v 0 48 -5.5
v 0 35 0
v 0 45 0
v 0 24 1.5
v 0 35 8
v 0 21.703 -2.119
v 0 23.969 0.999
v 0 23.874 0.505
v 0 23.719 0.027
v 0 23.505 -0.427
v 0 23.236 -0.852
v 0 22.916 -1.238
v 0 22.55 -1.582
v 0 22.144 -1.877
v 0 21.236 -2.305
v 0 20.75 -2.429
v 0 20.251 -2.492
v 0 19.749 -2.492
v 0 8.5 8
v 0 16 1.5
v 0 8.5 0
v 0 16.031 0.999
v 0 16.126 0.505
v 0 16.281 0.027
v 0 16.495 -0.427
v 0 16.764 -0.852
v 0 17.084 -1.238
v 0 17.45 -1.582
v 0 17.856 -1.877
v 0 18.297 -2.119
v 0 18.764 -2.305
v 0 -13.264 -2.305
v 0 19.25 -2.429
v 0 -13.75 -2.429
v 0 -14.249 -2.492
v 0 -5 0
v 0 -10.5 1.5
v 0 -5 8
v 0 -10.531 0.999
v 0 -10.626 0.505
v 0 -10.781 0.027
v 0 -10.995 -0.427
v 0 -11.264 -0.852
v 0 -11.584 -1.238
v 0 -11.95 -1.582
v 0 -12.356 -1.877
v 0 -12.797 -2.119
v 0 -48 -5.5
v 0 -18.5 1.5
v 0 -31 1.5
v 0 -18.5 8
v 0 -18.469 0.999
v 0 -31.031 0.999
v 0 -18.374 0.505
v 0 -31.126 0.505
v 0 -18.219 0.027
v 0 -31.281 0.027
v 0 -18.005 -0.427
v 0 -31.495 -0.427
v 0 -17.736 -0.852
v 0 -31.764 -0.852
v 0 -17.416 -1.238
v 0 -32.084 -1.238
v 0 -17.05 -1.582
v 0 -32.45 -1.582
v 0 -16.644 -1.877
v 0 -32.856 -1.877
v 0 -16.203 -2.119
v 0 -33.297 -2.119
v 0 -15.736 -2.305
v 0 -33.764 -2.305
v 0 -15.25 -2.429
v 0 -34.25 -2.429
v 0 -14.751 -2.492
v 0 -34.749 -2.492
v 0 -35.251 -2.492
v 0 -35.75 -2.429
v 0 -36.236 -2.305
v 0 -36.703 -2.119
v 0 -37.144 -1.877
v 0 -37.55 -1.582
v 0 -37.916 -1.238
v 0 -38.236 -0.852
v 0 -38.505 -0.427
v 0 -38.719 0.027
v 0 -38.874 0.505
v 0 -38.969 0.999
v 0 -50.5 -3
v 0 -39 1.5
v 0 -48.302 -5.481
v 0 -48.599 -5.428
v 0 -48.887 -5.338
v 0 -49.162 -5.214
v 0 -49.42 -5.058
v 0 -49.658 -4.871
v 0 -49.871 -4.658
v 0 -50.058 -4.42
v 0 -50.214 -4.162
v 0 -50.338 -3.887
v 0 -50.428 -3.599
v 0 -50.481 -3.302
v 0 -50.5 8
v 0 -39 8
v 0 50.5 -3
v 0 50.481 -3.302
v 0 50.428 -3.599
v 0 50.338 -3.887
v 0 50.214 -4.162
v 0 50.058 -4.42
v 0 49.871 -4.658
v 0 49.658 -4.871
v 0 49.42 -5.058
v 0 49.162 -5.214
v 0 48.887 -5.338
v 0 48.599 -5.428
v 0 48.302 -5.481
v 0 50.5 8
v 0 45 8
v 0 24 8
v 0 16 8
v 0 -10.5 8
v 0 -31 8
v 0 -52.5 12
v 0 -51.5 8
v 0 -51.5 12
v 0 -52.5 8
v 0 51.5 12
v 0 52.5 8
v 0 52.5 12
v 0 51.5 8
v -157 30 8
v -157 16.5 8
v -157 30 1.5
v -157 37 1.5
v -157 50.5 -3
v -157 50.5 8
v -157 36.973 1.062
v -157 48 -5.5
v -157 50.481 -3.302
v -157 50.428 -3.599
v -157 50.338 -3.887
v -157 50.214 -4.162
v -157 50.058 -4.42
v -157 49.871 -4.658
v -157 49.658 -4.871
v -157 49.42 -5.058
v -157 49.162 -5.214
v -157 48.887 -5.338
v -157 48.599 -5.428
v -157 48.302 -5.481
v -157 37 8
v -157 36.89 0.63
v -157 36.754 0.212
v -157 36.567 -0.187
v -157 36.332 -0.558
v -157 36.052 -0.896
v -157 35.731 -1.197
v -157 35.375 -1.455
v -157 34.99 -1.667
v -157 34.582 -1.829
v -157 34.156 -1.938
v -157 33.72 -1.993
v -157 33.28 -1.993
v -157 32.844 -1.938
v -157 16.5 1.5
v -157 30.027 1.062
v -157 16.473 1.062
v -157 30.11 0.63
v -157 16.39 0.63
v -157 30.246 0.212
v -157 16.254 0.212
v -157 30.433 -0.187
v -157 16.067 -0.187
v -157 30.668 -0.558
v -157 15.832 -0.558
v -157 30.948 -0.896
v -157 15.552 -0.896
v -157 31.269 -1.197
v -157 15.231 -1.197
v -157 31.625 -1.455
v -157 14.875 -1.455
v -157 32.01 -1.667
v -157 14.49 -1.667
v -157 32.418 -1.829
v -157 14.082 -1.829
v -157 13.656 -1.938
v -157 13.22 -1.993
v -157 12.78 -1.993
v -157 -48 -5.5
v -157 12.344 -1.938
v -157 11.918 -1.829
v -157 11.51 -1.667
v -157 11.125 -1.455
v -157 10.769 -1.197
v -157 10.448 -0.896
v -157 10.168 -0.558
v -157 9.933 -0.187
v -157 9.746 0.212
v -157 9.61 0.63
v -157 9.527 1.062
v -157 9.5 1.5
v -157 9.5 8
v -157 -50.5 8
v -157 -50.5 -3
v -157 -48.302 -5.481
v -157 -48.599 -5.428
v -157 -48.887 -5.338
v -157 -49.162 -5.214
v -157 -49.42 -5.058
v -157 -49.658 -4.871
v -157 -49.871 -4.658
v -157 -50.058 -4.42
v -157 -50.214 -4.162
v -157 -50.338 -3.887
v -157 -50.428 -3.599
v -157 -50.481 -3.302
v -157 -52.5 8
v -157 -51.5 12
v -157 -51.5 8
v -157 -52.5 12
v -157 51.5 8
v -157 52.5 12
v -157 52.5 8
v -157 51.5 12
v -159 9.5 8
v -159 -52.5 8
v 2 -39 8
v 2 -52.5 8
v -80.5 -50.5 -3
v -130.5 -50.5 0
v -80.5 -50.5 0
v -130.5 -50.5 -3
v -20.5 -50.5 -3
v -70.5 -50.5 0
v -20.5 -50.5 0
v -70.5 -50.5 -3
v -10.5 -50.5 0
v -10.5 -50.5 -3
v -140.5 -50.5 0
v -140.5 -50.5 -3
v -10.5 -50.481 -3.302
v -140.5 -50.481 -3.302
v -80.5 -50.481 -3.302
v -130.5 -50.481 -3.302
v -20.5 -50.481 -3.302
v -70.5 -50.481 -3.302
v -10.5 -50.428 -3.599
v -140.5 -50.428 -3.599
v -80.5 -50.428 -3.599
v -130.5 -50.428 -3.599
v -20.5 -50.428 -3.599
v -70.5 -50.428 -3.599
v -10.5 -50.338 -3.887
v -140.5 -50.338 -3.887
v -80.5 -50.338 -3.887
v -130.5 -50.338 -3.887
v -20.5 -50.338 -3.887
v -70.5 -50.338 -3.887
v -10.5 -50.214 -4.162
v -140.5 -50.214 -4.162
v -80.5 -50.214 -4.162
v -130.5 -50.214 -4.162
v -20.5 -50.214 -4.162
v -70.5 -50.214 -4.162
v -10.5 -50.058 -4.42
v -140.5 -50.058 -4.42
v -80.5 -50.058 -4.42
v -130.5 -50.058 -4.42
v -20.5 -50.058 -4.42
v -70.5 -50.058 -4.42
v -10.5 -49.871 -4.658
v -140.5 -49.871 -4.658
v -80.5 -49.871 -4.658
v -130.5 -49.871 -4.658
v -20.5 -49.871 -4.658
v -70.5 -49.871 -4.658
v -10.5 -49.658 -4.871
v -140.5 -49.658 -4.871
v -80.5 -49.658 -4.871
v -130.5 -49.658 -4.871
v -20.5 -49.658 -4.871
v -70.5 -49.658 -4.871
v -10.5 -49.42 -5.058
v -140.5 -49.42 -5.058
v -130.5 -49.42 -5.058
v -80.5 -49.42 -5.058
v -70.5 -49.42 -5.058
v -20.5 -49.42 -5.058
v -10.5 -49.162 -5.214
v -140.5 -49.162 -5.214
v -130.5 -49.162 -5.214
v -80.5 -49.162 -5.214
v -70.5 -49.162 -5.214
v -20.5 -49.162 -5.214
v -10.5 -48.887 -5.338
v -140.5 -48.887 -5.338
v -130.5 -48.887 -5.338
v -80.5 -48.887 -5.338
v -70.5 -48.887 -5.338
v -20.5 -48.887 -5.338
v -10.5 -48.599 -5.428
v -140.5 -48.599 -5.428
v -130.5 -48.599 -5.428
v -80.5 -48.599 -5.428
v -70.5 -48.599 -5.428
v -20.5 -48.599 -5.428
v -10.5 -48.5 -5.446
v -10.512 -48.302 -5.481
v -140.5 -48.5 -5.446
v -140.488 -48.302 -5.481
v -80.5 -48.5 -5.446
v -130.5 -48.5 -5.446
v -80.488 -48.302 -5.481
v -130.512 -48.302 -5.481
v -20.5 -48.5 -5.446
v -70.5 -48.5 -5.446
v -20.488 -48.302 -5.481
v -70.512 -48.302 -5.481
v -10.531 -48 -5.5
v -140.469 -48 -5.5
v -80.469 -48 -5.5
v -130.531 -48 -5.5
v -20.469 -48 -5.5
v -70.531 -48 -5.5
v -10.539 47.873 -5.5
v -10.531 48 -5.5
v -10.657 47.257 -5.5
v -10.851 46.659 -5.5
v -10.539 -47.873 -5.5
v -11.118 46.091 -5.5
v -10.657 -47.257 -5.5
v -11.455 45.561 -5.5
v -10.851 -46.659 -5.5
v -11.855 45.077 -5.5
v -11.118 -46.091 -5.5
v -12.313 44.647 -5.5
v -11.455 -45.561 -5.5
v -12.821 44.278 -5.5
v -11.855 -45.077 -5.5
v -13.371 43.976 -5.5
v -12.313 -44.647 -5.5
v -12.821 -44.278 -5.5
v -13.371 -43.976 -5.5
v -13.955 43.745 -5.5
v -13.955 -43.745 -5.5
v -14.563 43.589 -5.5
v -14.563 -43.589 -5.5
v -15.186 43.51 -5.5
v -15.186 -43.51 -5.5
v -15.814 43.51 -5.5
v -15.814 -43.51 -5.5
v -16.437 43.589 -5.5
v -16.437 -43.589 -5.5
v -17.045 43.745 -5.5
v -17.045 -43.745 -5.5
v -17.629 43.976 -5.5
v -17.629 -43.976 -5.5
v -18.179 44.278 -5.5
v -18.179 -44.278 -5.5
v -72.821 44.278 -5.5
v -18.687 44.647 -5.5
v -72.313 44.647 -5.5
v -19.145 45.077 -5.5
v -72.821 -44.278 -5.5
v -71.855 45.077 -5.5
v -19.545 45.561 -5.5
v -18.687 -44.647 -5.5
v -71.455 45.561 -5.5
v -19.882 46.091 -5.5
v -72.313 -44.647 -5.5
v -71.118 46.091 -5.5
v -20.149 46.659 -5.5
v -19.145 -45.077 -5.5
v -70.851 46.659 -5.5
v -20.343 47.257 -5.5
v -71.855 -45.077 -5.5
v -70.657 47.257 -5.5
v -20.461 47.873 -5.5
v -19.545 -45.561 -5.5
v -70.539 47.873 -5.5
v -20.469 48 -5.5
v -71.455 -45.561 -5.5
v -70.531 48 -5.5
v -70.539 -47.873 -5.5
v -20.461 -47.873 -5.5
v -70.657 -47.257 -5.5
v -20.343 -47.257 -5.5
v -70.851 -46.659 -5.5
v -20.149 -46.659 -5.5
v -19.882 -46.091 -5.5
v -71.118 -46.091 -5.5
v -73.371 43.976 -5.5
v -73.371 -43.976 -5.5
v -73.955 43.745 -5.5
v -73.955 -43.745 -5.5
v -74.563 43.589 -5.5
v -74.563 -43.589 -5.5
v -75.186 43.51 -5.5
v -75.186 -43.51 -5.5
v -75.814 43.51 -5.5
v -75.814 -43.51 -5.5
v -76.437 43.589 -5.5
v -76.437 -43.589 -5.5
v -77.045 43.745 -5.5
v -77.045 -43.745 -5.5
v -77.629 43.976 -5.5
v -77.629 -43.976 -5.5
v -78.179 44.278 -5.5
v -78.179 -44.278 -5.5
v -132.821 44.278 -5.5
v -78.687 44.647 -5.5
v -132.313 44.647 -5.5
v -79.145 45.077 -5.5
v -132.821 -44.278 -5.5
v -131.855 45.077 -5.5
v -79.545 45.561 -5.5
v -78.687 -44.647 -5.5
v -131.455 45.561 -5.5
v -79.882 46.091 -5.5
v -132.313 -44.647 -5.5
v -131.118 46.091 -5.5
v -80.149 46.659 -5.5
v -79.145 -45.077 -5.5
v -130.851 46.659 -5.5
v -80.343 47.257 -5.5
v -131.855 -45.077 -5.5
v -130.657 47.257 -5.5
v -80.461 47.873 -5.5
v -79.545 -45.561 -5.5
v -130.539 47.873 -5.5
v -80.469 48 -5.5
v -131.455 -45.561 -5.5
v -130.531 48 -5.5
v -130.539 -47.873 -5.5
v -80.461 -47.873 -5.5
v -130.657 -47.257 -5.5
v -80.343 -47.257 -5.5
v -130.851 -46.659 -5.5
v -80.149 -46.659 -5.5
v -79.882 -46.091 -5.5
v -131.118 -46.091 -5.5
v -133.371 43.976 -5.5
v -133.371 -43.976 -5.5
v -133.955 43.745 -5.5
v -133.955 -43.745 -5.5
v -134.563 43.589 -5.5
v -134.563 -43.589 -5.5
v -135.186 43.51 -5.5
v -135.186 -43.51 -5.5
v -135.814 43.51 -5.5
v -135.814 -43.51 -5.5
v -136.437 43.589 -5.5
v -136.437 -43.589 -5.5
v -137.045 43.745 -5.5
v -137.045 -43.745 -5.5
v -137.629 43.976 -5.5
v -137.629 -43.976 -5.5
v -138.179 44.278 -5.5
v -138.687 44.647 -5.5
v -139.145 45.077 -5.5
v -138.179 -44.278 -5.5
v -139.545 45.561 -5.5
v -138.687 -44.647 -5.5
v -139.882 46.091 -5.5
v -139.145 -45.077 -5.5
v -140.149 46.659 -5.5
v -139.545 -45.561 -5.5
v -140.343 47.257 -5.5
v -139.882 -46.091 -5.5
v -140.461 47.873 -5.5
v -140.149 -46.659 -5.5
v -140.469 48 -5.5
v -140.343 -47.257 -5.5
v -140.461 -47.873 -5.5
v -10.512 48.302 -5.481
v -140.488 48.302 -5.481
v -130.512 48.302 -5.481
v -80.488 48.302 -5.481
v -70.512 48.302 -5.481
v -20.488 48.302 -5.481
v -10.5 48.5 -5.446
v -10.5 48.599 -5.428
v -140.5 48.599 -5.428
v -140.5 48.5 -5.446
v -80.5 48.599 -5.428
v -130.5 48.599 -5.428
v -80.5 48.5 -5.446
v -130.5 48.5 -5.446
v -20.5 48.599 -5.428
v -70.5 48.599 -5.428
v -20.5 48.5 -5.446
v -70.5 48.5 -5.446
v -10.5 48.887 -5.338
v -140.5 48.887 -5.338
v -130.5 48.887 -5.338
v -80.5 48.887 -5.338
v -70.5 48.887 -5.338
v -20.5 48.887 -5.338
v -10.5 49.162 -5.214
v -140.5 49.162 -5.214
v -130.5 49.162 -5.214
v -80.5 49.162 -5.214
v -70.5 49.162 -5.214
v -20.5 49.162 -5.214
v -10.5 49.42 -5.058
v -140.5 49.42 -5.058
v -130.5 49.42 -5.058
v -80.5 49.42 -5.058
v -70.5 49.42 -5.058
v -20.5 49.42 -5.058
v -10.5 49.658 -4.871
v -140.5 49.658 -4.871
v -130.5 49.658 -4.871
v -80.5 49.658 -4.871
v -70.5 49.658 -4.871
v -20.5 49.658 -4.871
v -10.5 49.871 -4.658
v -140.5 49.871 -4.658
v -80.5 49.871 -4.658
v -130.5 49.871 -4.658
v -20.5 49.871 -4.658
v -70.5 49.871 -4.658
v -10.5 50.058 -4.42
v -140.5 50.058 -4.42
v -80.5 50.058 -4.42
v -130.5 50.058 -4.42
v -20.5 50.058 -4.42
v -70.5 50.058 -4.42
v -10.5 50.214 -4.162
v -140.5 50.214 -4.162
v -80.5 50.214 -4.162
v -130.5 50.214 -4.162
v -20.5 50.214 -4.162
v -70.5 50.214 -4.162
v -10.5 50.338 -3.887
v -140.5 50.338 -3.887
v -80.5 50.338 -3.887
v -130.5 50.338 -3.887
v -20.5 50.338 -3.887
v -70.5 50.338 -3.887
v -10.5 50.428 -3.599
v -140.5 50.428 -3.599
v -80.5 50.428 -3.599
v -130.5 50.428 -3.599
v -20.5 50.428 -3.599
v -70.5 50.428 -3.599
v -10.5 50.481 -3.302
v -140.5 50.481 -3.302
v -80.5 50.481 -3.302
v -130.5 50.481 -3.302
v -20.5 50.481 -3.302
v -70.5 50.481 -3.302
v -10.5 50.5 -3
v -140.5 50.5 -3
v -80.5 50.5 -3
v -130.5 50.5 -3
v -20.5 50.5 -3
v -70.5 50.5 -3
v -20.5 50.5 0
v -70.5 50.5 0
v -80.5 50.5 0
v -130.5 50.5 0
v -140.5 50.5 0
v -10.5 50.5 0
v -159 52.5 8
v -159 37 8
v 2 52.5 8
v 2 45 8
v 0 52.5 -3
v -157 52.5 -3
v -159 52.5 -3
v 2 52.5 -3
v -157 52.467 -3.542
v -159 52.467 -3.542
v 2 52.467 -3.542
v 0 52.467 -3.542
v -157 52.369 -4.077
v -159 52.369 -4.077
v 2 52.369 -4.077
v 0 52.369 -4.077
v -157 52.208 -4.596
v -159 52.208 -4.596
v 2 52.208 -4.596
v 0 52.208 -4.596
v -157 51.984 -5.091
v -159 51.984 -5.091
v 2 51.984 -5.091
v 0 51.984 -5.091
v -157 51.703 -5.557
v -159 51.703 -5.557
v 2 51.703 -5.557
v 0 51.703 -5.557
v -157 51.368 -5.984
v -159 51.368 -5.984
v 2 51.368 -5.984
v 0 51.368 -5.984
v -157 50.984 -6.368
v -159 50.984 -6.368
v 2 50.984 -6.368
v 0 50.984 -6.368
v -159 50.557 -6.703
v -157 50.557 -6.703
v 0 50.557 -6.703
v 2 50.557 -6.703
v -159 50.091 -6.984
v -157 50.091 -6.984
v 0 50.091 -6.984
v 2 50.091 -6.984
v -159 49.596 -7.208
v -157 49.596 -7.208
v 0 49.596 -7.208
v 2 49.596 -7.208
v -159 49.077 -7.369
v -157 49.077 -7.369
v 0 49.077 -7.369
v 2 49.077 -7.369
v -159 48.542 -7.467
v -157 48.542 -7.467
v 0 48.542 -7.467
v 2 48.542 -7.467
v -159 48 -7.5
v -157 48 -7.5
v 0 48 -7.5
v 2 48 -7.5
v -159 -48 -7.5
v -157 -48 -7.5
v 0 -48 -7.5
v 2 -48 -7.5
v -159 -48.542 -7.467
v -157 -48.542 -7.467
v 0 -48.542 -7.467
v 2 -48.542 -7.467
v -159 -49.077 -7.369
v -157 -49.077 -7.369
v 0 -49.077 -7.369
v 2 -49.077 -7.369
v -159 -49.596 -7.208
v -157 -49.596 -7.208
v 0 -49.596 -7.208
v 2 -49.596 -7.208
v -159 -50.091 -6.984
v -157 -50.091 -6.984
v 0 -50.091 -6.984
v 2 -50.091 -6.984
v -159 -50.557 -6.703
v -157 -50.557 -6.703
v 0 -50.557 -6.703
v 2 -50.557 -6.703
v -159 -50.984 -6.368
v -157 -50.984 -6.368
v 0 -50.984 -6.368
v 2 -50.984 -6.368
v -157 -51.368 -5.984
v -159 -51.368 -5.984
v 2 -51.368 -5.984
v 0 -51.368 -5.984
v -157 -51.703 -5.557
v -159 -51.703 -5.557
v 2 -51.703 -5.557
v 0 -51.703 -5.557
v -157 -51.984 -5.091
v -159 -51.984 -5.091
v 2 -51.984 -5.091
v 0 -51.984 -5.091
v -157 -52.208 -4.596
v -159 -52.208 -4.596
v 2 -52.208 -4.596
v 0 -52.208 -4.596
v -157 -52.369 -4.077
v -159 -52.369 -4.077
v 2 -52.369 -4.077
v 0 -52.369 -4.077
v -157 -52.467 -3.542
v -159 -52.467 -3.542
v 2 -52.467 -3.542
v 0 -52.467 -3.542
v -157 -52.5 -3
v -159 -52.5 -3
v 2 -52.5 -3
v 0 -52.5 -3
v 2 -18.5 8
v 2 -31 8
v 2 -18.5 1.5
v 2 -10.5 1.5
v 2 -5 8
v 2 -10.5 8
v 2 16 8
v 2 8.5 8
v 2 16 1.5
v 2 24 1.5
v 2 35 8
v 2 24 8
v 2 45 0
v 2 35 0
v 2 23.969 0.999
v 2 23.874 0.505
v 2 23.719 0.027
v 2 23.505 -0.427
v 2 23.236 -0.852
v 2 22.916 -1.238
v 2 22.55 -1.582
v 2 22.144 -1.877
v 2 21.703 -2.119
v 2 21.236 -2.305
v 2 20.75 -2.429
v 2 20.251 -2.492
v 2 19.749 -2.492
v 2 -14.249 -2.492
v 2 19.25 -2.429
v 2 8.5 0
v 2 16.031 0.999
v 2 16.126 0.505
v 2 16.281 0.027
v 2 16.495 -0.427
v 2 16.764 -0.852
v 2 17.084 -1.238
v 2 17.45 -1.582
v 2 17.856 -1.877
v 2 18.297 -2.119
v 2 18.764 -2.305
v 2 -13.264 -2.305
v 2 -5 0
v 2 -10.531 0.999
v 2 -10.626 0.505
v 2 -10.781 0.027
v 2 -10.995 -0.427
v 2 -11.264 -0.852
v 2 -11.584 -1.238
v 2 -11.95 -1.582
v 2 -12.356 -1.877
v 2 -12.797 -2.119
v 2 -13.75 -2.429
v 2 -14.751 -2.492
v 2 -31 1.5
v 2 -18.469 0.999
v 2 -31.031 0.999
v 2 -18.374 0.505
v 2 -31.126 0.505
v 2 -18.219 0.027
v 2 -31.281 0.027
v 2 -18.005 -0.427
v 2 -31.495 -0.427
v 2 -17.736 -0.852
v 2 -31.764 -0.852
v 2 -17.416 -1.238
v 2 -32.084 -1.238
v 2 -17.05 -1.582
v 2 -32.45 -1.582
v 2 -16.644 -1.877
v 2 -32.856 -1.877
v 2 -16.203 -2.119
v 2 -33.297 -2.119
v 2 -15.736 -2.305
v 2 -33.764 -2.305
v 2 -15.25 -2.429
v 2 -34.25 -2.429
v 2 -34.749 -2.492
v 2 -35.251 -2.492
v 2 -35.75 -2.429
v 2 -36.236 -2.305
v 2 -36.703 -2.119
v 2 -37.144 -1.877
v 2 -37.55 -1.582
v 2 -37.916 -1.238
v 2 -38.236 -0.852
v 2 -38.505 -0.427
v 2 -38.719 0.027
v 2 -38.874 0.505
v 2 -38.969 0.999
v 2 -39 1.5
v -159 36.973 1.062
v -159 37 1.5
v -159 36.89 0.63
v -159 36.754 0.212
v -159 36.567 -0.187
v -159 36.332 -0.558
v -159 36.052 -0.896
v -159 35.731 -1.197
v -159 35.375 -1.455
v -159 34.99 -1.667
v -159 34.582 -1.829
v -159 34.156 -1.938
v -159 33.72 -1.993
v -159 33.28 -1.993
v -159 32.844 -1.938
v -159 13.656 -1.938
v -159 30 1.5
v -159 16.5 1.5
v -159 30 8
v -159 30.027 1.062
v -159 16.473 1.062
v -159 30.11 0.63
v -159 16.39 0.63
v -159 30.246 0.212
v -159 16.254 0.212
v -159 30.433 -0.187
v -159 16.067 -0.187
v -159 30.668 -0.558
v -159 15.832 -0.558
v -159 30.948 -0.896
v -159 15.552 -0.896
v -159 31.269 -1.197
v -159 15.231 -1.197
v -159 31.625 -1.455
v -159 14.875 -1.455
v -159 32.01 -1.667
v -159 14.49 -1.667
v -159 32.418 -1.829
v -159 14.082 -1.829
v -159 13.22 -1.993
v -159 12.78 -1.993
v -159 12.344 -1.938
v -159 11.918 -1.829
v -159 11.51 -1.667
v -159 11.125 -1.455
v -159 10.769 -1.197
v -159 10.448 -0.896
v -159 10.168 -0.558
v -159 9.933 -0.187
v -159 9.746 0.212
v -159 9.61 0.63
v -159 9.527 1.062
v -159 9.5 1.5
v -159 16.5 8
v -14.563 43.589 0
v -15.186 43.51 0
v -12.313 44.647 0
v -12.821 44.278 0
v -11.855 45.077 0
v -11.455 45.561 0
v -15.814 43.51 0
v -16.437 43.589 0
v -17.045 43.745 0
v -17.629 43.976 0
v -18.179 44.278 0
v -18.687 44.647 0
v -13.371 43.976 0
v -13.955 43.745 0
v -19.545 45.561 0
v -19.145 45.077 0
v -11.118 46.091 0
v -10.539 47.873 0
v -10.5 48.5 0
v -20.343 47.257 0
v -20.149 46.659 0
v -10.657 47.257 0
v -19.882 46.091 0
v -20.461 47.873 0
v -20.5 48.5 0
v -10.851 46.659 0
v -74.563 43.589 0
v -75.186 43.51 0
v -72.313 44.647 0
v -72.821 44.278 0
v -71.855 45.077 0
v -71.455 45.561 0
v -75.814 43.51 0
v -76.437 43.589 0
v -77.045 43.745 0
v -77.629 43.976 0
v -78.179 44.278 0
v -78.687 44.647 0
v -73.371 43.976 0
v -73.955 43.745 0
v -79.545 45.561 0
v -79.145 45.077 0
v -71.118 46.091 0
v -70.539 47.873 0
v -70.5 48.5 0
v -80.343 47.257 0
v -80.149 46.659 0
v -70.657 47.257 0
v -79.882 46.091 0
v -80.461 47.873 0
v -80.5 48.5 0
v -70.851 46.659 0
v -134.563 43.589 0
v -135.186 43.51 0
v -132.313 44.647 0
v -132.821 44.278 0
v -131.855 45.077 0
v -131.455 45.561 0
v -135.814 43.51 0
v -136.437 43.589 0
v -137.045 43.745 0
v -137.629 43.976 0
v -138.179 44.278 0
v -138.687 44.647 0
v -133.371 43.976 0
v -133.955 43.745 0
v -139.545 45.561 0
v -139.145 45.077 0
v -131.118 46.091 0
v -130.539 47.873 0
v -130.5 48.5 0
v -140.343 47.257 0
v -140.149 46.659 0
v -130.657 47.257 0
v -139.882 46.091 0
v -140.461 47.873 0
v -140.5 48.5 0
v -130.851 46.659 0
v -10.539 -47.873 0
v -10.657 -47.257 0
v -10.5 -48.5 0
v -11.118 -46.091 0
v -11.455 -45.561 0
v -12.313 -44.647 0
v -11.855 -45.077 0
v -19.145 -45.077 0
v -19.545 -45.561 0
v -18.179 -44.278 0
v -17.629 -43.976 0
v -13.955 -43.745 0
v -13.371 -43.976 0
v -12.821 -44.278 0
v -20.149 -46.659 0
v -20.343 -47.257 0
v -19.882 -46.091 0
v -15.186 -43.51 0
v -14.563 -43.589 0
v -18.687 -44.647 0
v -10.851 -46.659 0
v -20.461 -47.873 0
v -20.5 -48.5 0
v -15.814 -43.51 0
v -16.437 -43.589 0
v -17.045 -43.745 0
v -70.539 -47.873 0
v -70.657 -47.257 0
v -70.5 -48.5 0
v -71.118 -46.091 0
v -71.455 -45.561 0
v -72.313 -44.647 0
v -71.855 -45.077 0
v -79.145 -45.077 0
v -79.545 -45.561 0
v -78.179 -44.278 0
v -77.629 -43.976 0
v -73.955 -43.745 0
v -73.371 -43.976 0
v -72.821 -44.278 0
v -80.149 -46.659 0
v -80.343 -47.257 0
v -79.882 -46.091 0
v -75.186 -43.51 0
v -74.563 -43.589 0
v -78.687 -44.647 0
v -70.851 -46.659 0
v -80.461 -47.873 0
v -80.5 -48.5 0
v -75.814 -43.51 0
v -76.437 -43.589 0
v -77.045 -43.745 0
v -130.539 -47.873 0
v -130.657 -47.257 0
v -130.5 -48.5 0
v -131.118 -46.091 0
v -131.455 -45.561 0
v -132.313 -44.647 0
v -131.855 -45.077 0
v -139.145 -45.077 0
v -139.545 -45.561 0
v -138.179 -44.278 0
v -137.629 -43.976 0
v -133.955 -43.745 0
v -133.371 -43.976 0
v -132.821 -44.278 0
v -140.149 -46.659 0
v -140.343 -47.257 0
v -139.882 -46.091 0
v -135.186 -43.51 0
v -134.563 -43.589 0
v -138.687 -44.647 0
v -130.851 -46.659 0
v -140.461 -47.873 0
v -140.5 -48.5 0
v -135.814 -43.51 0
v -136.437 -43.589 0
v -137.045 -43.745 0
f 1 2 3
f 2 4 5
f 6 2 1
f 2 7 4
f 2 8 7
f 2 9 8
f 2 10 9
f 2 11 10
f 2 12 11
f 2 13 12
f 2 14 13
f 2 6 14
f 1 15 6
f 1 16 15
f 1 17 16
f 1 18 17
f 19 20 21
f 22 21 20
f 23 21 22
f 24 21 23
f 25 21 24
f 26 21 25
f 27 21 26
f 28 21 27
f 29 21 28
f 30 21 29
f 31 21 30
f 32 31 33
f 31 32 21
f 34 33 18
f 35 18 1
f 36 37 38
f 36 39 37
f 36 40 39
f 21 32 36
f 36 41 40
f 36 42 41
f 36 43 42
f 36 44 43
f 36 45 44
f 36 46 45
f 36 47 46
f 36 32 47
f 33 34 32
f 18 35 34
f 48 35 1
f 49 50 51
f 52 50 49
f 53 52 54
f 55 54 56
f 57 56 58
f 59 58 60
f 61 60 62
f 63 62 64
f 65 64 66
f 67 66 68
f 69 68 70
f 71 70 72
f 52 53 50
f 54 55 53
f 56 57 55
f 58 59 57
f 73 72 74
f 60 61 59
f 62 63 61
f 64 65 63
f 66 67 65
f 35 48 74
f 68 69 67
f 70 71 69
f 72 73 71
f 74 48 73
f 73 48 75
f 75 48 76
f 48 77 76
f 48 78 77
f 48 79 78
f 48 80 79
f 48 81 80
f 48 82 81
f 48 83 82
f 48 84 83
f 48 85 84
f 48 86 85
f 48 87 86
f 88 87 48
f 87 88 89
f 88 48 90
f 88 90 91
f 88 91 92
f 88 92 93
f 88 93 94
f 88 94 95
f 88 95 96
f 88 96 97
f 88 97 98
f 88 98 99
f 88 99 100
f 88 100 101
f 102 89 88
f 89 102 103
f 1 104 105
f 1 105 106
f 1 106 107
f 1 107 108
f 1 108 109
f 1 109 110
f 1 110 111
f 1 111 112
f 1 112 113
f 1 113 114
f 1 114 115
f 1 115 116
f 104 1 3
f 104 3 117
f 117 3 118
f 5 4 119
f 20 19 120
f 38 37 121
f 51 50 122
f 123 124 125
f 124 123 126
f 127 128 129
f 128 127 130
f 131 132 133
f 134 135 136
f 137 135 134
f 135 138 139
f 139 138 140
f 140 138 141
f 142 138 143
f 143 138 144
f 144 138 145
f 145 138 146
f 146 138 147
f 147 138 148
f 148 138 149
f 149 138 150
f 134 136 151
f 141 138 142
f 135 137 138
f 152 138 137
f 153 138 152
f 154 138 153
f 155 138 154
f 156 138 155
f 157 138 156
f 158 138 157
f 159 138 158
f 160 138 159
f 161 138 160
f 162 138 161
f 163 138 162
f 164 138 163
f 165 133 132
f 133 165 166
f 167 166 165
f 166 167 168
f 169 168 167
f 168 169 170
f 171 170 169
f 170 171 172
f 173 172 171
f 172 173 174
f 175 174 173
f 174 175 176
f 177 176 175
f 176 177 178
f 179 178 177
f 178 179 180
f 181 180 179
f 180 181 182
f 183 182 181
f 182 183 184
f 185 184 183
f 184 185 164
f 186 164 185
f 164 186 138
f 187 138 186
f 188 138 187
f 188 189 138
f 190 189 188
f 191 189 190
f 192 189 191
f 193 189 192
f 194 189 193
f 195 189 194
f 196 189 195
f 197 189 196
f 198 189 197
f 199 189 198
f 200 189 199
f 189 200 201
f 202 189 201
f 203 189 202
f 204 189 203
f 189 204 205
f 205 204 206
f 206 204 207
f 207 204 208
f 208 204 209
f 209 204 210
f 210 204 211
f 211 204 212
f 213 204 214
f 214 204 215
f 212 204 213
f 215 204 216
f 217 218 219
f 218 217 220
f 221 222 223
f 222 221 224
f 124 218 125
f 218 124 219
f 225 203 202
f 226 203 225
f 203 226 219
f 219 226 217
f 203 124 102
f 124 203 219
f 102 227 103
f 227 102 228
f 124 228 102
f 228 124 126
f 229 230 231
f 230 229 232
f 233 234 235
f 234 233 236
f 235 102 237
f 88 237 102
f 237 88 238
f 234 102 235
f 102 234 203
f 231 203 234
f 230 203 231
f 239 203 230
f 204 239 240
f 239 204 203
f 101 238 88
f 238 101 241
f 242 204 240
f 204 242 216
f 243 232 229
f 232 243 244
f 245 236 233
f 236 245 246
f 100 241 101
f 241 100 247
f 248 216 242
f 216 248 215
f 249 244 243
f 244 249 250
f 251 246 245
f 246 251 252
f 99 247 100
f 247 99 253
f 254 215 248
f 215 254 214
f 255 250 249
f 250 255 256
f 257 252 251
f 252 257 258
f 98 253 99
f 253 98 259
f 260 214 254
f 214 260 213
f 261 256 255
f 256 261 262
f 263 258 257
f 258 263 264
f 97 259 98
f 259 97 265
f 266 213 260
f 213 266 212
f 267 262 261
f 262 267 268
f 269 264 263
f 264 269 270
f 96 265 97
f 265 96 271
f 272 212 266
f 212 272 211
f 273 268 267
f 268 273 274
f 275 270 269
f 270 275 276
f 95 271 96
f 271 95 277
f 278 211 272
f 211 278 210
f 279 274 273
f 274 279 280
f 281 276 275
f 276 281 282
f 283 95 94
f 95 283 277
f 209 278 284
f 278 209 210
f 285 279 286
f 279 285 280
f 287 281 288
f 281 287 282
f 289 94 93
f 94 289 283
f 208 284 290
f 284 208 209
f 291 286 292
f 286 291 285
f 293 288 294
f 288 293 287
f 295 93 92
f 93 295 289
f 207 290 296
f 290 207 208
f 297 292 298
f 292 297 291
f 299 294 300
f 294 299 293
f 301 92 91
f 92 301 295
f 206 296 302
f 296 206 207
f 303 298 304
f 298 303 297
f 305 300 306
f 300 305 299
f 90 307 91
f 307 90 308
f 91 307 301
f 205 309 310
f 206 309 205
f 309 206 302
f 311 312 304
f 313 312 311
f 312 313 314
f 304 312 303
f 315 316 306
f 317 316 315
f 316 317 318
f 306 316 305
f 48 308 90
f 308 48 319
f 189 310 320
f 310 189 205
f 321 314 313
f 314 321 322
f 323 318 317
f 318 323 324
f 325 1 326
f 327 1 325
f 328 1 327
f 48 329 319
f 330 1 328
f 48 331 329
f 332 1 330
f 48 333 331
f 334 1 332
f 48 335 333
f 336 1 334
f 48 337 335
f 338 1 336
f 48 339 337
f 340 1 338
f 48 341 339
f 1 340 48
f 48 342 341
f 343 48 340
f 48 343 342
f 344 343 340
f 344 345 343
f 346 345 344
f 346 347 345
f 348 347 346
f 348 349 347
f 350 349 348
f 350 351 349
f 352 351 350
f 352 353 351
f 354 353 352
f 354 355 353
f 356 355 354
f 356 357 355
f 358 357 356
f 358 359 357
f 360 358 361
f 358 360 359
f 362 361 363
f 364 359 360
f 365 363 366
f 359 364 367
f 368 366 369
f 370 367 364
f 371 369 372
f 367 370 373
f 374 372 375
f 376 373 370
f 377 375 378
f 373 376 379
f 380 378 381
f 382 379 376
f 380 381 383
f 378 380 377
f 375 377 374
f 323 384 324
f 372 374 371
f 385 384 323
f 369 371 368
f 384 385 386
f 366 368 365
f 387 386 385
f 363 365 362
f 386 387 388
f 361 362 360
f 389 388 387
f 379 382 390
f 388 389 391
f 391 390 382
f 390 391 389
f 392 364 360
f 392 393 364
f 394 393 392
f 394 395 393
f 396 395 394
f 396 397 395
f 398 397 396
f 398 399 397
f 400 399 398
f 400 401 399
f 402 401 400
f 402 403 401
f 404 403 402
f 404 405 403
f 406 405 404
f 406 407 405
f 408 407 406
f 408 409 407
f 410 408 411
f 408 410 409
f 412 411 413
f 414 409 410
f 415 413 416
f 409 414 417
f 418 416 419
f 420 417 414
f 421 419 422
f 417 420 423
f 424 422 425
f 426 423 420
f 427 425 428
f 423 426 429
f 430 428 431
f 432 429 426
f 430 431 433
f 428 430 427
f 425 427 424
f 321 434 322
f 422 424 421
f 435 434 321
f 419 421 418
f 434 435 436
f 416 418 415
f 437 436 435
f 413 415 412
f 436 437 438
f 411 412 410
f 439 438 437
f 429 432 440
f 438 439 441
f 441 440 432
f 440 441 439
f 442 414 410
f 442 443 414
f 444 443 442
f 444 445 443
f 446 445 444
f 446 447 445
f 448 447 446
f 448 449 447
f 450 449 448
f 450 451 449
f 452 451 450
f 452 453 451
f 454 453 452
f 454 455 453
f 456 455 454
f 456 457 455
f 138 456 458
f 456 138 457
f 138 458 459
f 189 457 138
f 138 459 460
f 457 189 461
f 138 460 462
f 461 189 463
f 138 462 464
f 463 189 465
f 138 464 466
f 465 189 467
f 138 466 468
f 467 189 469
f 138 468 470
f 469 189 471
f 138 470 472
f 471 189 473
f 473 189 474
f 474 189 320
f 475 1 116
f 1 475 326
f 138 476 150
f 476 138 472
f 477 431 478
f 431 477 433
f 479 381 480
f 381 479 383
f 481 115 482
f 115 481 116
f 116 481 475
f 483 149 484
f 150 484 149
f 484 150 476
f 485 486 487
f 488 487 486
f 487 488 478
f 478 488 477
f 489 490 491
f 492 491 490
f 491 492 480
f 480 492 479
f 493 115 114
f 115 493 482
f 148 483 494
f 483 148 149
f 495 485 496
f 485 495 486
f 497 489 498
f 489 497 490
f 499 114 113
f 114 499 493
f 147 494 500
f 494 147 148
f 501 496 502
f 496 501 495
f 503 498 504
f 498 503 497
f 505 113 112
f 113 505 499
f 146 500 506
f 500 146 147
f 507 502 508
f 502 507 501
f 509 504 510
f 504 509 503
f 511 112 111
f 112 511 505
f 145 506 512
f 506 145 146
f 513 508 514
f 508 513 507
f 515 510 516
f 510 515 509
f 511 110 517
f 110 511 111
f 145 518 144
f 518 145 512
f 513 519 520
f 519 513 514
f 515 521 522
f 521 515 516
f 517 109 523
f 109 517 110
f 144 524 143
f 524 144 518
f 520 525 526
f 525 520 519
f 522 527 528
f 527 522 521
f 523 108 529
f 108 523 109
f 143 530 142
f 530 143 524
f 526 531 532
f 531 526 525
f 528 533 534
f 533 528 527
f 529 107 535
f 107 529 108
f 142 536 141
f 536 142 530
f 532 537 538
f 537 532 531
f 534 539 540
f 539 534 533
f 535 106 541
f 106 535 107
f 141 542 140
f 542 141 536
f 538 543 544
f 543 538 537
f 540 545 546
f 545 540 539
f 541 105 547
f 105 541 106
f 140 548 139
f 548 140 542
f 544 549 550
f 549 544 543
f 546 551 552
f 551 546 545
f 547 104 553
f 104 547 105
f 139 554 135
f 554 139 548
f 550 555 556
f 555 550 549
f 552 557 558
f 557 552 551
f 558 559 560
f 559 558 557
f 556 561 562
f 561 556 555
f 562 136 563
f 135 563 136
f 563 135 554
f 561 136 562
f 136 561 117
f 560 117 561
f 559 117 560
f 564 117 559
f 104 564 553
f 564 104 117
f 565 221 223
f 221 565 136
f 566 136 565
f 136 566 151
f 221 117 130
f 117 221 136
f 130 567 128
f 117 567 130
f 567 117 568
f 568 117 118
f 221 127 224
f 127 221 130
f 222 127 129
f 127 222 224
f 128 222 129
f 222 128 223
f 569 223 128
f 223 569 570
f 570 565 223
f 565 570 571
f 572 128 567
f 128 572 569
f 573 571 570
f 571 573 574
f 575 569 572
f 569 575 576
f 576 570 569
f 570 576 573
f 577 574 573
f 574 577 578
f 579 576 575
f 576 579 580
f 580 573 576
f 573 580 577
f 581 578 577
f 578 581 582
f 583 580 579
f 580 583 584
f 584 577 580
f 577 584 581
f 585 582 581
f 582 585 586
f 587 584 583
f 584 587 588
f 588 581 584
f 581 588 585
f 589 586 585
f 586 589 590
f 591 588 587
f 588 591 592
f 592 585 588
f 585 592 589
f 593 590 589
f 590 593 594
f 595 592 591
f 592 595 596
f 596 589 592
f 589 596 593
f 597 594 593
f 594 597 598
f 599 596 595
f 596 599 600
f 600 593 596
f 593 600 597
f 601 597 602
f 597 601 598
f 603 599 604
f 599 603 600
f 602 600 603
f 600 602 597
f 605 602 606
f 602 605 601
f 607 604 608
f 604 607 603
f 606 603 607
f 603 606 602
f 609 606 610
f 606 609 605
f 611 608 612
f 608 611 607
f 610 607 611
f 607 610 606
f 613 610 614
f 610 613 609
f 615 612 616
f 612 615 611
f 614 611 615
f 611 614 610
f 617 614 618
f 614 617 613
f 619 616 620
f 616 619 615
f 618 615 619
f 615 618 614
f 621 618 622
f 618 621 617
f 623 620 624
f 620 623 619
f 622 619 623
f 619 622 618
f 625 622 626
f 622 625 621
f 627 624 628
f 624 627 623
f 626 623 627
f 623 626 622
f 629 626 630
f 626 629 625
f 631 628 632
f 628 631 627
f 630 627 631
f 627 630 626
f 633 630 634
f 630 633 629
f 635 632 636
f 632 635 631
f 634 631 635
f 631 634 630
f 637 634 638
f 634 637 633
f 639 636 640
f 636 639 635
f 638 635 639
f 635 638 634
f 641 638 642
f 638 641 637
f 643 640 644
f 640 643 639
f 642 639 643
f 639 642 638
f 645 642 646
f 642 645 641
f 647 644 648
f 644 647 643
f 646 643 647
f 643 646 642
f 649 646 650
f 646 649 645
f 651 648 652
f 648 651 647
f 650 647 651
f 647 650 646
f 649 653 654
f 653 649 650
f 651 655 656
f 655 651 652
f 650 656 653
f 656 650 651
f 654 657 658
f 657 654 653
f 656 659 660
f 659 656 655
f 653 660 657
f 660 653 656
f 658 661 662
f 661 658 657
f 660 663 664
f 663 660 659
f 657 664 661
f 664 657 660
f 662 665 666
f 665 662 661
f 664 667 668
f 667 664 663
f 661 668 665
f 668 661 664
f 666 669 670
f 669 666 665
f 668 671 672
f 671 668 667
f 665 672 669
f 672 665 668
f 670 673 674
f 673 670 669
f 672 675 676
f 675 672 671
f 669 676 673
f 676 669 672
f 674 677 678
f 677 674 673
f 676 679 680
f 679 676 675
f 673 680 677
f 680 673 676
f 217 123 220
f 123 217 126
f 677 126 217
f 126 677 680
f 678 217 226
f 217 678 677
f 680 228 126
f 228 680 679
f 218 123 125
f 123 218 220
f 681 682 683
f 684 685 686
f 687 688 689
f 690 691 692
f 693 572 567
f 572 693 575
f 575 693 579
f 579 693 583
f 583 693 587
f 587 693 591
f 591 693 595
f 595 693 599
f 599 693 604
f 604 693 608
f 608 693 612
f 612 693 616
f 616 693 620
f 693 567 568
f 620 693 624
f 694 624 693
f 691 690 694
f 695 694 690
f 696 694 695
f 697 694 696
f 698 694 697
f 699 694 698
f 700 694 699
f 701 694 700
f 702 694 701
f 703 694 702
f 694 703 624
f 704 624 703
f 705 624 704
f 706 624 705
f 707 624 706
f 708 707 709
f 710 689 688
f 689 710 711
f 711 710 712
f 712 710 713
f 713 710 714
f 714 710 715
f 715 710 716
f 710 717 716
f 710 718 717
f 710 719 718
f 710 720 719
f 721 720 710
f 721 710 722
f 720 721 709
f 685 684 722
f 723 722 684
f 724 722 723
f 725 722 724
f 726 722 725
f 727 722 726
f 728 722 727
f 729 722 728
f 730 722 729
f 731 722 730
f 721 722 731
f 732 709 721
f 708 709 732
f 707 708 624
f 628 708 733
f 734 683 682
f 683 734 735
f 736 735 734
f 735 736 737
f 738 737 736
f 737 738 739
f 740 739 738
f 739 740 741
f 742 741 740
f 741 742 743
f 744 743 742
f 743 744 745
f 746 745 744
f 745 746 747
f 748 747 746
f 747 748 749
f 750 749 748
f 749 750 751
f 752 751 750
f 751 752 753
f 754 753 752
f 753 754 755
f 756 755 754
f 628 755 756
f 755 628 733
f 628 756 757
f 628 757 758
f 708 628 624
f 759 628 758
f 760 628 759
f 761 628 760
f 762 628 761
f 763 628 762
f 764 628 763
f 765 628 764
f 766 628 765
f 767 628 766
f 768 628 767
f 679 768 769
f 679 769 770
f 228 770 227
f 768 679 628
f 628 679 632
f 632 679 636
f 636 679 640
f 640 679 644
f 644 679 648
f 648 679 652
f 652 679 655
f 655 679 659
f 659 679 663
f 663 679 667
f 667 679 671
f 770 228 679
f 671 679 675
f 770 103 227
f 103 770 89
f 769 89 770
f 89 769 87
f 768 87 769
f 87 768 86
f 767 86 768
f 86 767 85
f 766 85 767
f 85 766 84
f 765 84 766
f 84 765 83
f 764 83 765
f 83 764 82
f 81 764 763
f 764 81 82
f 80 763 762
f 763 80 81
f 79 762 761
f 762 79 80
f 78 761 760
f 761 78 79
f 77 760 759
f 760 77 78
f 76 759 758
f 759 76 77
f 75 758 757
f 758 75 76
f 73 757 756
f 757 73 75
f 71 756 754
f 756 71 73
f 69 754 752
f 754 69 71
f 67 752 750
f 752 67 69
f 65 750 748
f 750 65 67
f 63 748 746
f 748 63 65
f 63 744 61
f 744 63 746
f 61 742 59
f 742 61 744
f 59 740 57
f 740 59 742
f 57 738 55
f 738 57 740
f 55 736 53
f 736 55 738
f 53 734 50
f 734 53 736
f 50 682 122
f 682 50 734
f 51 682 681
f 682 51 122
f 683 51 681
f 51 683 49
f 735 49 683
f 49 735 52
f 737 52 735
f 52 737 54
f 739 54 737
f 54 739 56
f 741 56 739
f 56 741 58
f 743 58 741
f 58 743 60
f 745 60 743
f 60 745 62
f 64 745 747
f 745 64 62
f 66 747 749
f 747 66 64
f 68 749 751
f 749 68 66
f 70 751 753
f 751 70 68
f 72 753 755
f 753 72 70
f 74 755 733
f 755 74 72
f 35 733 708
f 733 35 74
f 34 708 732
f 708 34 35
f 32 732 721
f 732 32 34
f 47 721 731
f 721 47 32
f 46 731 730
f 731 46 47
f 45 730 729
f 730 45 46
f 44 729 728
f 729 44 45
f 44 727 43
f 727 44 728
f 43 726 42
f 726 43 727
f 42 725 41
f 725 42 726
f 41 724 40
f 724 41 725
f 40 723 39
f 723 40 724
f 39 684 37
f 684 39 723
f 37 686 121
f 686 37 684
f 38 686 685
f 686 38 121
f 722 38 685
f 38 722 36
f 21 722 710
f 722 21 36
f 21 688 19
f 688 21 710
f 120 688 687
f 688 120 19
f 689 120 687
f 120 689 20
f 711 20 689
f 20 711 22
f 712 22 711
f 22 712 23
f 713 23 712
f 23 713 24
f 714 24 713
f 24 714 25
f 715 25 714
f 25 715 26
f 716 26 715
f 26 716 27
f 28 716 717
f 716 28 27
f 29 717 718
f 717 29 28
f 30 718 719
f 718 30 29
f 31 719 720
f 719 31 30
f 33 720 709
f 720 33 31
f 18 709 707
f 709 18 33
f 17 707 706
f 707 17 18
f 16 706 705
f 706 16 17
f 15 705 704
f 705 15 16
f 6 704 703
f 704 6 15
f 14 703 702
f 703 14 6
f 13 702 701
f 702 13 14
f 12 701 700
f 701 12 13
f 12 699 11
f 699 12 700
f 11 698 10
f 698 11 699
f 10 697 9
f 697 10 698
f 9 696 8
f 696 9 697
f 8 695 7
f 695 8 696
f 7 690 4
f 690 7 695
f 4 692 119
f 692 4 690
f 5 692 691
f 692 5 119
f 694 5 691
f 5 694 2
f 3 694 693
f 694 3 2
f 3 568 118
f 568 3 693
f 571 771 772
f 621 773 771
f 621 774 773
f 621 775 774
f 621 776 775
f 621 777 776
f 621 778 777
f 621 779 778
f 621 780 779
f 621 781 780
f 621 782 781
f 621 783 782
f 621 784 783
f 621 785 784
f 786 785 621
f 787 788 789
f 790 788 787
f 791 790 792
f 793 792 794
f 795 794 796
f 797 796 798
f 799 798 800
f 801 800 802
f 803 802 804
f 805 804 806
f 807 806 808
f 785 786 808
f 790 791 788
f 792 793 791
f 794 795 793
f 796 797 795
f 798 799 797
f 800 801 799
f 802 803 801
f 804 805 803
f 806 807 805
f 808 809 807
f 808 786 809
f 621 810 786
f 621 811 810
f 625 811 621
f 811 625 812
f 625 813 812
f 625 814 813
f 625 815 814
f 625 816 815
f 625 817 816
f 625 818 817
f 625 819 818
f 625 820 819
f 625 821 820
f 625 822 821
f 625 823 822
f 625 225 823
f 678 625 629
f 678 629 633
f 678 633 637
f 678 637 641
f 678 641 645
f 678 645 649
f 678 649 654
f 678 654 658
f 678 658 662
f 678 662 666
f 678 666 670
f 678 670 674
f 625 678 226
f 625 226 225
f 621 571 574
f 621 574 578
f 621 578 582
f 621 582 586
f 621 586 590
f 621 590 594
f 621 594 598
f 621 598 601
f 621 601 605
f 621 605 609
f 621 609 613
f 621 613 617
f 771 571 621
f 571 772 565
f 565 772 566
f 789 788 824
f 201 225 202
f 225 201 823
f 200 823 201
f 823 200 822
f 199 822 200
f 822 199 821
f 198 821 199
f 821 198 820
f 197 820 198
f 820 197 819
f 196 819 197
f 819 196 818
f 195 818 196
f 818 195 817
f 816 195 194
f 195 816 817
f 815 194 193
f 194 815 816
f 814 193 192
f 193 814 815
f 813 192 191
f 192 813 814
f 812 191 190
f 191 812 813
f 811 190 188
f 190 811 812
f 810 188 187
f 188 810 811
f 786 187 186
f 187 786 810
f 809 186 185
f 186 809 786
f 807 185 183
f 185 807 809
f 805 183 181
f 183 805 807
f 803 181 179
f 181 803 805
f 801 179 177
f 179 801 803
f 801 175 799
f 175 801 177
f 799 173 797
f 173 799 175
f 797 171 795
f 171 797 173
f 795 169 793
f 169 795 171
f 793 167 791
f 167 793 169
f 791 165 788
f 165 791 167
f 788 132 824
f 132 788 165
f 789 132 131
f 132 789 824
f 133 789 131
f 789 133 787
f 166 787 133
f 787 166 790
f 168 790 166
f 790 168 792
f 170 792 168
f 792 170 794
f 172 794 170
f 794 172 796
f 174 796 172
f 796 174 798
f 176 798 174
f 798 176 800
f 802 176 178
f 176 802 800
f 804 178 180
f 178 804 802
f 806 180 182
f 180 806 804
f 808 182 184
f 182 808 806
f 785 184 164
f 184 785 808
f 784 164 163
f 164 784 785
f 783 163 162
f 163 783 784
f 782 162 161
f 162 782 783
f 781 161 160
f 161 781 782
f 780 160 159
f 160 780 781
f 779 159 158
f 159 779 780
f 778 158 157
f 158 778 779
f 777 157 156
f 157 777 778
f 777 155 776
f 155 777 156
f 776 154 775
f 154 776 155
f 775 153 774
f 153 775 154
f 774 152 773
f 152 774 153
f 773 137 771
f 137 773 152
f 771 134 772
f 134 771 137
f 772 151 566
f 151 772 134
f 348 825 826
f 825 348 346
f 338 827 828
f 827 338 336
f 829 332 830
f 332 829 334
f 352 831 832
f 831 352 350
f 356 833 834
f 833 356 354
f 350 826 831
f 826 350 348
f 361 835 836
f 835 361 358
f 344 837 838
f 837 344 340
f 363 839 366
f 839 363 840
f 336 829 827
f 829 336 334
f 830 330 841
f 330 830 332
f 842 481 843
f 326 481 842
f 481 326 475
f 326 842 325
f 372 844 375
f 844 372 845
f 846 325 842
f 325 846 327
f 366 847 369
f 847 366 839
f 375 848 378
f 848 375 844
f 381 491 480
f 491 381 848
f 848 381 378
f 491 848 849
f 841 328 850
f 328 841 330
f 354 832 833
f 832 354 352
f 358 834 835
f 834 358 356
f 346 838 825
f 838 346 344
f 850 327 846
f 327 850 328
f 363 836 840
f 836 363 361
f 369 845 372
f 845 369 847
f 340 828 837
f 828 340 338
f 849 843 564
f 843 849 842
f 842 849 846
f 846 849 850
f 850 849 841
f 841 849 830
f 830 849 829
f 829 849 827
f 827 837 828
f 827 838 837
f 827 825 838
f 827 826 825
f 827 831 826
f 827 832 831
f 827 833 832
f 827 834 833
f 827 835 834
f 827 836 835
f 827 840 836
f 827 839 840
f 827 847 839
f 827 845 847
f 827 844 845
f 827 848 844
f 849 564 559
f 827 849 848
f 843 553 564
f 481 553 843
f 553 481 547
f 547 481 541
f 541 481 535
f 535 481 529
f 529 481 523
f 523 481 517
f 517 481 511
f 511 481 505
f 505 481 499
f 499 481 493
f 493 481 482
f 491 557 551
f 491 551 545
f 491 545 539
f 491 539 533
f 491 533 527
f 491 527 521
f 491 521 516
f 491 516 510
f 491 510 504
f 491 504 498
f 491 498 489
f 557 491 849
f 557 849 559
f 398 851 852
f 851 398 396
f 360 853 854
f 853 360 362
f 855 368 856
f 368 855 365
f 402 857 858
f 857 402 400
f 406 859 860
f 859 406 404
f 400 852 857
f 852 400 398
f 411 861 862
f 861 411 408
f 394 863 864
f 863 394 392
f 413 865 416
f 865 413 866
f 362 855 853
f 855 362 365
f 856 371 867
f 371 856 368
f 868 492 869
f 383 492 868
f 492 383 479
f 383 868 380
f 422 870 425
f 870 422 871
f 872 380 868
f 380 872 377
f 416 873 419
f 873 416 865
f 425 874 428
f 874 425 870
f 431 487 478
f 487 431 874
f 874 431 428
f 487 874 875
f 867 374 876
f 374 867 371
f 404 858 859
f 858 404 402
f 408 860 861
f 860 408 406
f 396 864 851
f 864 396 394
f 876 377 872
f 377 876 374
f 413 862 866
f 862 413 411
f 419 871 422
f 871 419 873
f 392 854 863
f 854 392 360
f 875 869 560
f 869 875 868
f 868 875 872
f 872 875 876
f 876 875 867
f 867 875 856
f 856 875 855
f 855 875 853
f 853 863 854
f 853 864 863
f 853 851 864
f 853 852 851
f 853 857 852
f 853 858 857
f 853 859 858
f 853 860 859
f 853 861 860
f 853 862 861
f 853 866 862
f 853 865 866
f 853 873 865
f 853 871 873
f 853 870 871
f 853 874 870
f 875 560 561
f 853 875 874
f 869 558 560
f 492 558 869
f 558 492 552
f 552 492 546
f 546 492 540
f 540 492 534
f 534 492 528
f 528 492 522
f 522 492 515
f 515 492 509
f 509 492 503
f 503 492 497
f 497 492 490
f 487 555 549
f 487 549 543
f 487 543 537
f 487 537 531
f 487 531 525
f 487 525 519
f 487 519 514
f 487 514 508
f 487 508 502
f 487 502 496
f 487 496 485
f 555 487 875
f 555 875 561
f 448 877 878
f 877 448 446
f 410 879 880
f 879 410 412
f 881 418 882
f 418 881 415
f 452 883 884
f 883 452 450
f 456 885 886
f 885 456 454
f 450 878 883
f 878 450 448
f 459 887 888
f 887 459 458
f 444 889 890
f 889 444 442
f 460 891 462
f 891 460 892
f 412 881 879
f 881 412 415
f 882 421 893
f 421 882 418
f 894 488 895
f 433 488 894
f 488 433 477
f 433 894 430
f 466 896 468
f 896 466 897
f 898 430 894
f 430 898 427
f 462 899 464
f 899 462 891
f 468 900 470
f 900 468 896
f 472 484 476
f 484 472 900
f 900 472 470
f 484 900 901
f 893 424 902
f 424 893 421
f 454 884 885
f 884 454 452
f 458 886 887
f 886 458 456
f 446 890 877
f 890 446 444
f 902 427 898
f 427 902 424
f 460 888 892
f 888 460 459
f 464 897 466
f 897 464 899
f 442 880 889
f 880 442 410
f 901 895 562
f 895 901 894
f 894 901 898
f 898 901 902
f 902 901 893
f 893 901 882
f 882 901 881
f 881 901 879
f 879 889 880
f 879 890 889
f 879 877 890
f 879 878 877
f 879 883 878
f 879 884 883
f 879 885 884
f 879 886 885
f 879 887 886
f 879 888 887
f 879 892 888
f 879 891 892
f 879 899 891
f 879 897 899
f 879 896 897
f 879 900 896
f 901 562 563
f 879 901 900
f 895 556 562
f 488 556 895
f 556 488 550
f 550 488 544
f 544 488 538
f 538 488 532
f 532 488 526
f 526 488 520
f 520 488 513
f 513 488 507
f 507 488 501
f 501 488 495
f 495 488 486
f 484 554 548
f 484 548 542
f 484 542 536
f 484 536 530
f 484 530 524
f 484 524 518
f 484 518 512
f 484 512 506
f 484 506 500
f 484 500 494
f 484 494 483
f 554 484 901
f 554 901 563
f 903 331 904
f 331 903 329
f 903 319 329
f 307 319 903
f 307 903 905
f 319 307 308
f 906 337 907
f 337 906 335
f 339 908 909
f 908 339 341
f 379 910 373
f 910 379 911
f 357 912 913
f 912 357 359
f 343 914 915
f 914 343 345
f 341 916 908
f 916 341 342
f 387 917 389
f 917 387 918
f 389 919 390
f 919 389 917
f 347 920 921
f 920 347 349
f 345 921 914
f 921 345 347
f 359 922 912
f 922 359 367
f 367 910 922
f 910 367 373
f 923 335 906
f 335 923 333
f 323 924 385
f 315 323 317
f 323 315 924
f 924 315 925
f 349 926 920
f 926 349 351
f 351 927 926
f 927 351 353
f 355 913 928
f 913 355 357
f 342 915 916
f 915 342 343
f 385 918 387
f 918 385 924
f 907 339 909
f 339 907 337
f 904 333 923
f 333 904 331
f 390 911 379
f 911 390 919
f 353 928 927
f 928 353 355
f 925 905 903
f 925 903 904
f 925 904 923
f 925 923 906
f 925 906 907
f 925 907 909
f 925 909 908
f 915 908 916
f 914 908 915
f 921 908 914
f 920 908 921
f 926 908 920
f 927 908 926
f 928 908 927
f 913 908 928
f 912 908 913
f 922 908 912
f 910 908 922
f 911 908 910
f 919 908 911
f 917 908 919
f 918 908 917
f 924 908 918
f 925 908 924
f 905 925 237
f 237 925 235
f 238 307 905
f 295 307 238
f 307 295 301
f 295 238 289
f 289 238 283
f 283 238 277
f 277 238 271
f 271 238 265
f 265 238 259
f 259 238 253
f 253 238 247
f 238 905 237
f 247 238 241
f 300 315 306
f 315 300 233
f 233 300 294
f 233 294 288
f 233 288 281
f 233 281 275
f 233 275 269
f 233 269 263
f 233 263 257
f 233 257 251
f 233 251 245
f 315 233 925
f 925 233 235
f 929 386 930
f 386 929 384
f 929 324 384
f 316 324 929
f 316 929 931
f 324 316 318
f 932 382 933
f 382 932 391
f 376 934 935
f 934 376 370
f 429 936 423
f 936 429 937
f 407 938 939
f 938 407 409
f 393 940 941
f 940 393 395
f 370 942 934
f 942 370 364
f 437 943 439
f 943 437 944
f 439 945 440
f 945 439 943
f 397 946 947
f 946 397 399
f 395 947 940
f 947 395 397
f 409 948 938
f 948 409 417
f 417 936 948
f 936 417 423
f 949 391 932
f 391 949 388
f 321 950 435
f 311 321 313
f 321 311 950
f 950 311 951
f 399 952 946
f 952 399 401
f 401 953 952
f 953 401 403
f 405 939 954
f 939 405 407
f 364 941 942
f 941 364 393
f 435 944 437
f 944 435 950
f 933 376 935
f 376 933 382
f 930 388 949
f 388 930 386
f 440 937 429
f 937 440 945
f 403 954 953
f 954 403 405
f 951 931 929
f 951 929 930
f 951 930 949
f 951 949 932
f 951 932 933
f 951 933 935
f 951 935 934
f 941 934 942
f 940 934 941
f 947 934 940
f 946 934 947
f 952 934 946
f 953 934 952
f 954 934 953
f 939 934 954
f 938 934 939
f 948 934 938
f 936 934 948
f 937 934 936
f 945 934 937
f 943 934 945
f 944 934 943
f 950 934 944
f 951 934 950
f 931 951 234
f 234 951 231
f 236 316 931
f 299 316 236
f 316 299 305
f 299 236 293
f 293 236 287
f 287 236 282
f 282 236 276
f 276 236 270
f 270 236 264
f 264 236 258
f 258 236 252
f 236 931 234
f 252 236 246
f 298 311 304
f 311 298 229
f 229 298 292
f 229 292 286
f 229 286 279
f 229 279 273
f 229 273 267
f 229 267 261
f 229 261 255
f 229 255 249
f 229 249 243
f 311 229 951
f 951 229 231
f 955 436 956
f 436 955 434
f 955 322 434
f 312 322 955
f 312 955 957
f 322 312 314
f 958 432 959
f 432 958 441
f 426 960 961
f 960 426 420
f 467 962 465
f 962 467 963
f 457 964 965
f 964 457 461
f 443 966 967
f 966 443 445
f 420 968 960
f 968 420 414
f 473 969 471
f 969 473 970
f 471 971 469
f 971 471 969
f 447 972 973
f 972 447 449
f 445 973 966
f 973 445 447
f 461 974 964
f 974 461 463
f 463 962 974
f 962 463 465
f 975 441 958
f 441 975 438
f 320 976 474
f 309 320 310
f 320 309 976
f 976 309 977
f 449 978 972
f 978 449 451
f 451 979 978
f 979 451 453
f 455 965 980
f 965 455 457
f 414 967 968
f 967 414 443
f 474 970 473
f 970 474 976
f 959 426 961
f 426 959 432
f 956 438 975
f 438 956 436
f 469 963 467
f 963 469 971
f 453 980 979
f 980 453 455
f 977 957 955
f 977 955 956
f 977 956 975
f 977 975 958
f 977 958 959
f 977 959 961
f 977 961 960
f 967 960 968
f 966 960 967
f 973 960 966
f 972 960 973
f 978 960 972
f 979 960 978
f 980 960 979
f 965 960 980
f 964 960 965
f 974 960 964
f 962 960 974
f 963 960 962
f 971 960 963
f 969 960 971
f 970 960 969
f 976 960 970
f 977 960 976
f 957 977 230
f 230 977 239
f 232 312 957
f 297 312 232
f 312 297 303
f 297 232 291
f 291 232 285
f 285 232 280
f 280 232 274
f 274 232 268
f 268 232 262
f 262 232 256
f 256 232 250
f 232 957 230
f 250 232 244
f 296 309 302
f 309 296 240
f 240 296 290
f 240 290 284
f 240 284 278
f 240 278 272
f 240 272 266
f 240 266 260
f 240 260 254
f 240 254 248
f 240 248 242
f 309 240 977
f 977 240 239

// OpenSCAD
/* =====================================================================================
 *
 *       Filename:  bottom_case.scad
 *
 *    Description:  Bottom case for an USRP B200 (sdr card)
 *
 *        Version:  1.0
 *        Created:  02 06 2015
 *       Revision:  none
 *       Compiler:  gcc
 *
 *         Author:  Sebastien Chassot (sinux), sebastien.chassot@etu.hesge.ch
 *        Company:  HES-SO hepia section ITI (soir)
 *
 * =====================================================================================
 */

length = 157;      // case length
thickness = 2;     // case thickness
diam = 10;


difference(){
    
    /* union of base, 2 side and 6 supports*/
    union(){
        rotate([0,-90,0]){
            /* base extrusion */
            linear_extrude(height=length, $fn=50)
                import("2d-sections/bottom_case_sec.dxf");
            
            translate([0,0,-thickness]){
                /* */    
                linear_extrude(height=thickness, $fn=50)
                    import("2d-sections/bottom_usb_side.dxf");
            }
            
            translate([0,0,length]){
                /* */    
                linear_extrude(height=thickness, $fn=50)
                    import("2d-sections/bottom_antenna_side.dxf");
            }
        }
        
        /* 3 support (middle one is unused) */
        translate([-15.5,48.5,-7]){
            for(i=[0:2]){
                translate([-60*i,0,0]){
                    union(){
                        cylinder(d=diam,h=7, $fn=50);
                        translate([-diam/2,0,0]){
                            cube([diam,4,7], center=false);
                        }
                    }
                }
            }
        }
        translate([-15.5,-48.5,-7]){
            for(i=[0:2]){
                translate([-60*i,0,0]){
                    union(){
                        cylinder(d=diam,h=7, $fn=50);
                        translate([-diam/2,-4,0]){
                            cube([diam,4,7], center=false);
                        }
                    }
                }
            }
        }
    }
    
    /* remove support overstep */
    rotate([0,-90,0]){
        linear_extrude(height=length, $fn=50)
            import("2d-sections/bottom_outside_remove.dxf");
    }
}
